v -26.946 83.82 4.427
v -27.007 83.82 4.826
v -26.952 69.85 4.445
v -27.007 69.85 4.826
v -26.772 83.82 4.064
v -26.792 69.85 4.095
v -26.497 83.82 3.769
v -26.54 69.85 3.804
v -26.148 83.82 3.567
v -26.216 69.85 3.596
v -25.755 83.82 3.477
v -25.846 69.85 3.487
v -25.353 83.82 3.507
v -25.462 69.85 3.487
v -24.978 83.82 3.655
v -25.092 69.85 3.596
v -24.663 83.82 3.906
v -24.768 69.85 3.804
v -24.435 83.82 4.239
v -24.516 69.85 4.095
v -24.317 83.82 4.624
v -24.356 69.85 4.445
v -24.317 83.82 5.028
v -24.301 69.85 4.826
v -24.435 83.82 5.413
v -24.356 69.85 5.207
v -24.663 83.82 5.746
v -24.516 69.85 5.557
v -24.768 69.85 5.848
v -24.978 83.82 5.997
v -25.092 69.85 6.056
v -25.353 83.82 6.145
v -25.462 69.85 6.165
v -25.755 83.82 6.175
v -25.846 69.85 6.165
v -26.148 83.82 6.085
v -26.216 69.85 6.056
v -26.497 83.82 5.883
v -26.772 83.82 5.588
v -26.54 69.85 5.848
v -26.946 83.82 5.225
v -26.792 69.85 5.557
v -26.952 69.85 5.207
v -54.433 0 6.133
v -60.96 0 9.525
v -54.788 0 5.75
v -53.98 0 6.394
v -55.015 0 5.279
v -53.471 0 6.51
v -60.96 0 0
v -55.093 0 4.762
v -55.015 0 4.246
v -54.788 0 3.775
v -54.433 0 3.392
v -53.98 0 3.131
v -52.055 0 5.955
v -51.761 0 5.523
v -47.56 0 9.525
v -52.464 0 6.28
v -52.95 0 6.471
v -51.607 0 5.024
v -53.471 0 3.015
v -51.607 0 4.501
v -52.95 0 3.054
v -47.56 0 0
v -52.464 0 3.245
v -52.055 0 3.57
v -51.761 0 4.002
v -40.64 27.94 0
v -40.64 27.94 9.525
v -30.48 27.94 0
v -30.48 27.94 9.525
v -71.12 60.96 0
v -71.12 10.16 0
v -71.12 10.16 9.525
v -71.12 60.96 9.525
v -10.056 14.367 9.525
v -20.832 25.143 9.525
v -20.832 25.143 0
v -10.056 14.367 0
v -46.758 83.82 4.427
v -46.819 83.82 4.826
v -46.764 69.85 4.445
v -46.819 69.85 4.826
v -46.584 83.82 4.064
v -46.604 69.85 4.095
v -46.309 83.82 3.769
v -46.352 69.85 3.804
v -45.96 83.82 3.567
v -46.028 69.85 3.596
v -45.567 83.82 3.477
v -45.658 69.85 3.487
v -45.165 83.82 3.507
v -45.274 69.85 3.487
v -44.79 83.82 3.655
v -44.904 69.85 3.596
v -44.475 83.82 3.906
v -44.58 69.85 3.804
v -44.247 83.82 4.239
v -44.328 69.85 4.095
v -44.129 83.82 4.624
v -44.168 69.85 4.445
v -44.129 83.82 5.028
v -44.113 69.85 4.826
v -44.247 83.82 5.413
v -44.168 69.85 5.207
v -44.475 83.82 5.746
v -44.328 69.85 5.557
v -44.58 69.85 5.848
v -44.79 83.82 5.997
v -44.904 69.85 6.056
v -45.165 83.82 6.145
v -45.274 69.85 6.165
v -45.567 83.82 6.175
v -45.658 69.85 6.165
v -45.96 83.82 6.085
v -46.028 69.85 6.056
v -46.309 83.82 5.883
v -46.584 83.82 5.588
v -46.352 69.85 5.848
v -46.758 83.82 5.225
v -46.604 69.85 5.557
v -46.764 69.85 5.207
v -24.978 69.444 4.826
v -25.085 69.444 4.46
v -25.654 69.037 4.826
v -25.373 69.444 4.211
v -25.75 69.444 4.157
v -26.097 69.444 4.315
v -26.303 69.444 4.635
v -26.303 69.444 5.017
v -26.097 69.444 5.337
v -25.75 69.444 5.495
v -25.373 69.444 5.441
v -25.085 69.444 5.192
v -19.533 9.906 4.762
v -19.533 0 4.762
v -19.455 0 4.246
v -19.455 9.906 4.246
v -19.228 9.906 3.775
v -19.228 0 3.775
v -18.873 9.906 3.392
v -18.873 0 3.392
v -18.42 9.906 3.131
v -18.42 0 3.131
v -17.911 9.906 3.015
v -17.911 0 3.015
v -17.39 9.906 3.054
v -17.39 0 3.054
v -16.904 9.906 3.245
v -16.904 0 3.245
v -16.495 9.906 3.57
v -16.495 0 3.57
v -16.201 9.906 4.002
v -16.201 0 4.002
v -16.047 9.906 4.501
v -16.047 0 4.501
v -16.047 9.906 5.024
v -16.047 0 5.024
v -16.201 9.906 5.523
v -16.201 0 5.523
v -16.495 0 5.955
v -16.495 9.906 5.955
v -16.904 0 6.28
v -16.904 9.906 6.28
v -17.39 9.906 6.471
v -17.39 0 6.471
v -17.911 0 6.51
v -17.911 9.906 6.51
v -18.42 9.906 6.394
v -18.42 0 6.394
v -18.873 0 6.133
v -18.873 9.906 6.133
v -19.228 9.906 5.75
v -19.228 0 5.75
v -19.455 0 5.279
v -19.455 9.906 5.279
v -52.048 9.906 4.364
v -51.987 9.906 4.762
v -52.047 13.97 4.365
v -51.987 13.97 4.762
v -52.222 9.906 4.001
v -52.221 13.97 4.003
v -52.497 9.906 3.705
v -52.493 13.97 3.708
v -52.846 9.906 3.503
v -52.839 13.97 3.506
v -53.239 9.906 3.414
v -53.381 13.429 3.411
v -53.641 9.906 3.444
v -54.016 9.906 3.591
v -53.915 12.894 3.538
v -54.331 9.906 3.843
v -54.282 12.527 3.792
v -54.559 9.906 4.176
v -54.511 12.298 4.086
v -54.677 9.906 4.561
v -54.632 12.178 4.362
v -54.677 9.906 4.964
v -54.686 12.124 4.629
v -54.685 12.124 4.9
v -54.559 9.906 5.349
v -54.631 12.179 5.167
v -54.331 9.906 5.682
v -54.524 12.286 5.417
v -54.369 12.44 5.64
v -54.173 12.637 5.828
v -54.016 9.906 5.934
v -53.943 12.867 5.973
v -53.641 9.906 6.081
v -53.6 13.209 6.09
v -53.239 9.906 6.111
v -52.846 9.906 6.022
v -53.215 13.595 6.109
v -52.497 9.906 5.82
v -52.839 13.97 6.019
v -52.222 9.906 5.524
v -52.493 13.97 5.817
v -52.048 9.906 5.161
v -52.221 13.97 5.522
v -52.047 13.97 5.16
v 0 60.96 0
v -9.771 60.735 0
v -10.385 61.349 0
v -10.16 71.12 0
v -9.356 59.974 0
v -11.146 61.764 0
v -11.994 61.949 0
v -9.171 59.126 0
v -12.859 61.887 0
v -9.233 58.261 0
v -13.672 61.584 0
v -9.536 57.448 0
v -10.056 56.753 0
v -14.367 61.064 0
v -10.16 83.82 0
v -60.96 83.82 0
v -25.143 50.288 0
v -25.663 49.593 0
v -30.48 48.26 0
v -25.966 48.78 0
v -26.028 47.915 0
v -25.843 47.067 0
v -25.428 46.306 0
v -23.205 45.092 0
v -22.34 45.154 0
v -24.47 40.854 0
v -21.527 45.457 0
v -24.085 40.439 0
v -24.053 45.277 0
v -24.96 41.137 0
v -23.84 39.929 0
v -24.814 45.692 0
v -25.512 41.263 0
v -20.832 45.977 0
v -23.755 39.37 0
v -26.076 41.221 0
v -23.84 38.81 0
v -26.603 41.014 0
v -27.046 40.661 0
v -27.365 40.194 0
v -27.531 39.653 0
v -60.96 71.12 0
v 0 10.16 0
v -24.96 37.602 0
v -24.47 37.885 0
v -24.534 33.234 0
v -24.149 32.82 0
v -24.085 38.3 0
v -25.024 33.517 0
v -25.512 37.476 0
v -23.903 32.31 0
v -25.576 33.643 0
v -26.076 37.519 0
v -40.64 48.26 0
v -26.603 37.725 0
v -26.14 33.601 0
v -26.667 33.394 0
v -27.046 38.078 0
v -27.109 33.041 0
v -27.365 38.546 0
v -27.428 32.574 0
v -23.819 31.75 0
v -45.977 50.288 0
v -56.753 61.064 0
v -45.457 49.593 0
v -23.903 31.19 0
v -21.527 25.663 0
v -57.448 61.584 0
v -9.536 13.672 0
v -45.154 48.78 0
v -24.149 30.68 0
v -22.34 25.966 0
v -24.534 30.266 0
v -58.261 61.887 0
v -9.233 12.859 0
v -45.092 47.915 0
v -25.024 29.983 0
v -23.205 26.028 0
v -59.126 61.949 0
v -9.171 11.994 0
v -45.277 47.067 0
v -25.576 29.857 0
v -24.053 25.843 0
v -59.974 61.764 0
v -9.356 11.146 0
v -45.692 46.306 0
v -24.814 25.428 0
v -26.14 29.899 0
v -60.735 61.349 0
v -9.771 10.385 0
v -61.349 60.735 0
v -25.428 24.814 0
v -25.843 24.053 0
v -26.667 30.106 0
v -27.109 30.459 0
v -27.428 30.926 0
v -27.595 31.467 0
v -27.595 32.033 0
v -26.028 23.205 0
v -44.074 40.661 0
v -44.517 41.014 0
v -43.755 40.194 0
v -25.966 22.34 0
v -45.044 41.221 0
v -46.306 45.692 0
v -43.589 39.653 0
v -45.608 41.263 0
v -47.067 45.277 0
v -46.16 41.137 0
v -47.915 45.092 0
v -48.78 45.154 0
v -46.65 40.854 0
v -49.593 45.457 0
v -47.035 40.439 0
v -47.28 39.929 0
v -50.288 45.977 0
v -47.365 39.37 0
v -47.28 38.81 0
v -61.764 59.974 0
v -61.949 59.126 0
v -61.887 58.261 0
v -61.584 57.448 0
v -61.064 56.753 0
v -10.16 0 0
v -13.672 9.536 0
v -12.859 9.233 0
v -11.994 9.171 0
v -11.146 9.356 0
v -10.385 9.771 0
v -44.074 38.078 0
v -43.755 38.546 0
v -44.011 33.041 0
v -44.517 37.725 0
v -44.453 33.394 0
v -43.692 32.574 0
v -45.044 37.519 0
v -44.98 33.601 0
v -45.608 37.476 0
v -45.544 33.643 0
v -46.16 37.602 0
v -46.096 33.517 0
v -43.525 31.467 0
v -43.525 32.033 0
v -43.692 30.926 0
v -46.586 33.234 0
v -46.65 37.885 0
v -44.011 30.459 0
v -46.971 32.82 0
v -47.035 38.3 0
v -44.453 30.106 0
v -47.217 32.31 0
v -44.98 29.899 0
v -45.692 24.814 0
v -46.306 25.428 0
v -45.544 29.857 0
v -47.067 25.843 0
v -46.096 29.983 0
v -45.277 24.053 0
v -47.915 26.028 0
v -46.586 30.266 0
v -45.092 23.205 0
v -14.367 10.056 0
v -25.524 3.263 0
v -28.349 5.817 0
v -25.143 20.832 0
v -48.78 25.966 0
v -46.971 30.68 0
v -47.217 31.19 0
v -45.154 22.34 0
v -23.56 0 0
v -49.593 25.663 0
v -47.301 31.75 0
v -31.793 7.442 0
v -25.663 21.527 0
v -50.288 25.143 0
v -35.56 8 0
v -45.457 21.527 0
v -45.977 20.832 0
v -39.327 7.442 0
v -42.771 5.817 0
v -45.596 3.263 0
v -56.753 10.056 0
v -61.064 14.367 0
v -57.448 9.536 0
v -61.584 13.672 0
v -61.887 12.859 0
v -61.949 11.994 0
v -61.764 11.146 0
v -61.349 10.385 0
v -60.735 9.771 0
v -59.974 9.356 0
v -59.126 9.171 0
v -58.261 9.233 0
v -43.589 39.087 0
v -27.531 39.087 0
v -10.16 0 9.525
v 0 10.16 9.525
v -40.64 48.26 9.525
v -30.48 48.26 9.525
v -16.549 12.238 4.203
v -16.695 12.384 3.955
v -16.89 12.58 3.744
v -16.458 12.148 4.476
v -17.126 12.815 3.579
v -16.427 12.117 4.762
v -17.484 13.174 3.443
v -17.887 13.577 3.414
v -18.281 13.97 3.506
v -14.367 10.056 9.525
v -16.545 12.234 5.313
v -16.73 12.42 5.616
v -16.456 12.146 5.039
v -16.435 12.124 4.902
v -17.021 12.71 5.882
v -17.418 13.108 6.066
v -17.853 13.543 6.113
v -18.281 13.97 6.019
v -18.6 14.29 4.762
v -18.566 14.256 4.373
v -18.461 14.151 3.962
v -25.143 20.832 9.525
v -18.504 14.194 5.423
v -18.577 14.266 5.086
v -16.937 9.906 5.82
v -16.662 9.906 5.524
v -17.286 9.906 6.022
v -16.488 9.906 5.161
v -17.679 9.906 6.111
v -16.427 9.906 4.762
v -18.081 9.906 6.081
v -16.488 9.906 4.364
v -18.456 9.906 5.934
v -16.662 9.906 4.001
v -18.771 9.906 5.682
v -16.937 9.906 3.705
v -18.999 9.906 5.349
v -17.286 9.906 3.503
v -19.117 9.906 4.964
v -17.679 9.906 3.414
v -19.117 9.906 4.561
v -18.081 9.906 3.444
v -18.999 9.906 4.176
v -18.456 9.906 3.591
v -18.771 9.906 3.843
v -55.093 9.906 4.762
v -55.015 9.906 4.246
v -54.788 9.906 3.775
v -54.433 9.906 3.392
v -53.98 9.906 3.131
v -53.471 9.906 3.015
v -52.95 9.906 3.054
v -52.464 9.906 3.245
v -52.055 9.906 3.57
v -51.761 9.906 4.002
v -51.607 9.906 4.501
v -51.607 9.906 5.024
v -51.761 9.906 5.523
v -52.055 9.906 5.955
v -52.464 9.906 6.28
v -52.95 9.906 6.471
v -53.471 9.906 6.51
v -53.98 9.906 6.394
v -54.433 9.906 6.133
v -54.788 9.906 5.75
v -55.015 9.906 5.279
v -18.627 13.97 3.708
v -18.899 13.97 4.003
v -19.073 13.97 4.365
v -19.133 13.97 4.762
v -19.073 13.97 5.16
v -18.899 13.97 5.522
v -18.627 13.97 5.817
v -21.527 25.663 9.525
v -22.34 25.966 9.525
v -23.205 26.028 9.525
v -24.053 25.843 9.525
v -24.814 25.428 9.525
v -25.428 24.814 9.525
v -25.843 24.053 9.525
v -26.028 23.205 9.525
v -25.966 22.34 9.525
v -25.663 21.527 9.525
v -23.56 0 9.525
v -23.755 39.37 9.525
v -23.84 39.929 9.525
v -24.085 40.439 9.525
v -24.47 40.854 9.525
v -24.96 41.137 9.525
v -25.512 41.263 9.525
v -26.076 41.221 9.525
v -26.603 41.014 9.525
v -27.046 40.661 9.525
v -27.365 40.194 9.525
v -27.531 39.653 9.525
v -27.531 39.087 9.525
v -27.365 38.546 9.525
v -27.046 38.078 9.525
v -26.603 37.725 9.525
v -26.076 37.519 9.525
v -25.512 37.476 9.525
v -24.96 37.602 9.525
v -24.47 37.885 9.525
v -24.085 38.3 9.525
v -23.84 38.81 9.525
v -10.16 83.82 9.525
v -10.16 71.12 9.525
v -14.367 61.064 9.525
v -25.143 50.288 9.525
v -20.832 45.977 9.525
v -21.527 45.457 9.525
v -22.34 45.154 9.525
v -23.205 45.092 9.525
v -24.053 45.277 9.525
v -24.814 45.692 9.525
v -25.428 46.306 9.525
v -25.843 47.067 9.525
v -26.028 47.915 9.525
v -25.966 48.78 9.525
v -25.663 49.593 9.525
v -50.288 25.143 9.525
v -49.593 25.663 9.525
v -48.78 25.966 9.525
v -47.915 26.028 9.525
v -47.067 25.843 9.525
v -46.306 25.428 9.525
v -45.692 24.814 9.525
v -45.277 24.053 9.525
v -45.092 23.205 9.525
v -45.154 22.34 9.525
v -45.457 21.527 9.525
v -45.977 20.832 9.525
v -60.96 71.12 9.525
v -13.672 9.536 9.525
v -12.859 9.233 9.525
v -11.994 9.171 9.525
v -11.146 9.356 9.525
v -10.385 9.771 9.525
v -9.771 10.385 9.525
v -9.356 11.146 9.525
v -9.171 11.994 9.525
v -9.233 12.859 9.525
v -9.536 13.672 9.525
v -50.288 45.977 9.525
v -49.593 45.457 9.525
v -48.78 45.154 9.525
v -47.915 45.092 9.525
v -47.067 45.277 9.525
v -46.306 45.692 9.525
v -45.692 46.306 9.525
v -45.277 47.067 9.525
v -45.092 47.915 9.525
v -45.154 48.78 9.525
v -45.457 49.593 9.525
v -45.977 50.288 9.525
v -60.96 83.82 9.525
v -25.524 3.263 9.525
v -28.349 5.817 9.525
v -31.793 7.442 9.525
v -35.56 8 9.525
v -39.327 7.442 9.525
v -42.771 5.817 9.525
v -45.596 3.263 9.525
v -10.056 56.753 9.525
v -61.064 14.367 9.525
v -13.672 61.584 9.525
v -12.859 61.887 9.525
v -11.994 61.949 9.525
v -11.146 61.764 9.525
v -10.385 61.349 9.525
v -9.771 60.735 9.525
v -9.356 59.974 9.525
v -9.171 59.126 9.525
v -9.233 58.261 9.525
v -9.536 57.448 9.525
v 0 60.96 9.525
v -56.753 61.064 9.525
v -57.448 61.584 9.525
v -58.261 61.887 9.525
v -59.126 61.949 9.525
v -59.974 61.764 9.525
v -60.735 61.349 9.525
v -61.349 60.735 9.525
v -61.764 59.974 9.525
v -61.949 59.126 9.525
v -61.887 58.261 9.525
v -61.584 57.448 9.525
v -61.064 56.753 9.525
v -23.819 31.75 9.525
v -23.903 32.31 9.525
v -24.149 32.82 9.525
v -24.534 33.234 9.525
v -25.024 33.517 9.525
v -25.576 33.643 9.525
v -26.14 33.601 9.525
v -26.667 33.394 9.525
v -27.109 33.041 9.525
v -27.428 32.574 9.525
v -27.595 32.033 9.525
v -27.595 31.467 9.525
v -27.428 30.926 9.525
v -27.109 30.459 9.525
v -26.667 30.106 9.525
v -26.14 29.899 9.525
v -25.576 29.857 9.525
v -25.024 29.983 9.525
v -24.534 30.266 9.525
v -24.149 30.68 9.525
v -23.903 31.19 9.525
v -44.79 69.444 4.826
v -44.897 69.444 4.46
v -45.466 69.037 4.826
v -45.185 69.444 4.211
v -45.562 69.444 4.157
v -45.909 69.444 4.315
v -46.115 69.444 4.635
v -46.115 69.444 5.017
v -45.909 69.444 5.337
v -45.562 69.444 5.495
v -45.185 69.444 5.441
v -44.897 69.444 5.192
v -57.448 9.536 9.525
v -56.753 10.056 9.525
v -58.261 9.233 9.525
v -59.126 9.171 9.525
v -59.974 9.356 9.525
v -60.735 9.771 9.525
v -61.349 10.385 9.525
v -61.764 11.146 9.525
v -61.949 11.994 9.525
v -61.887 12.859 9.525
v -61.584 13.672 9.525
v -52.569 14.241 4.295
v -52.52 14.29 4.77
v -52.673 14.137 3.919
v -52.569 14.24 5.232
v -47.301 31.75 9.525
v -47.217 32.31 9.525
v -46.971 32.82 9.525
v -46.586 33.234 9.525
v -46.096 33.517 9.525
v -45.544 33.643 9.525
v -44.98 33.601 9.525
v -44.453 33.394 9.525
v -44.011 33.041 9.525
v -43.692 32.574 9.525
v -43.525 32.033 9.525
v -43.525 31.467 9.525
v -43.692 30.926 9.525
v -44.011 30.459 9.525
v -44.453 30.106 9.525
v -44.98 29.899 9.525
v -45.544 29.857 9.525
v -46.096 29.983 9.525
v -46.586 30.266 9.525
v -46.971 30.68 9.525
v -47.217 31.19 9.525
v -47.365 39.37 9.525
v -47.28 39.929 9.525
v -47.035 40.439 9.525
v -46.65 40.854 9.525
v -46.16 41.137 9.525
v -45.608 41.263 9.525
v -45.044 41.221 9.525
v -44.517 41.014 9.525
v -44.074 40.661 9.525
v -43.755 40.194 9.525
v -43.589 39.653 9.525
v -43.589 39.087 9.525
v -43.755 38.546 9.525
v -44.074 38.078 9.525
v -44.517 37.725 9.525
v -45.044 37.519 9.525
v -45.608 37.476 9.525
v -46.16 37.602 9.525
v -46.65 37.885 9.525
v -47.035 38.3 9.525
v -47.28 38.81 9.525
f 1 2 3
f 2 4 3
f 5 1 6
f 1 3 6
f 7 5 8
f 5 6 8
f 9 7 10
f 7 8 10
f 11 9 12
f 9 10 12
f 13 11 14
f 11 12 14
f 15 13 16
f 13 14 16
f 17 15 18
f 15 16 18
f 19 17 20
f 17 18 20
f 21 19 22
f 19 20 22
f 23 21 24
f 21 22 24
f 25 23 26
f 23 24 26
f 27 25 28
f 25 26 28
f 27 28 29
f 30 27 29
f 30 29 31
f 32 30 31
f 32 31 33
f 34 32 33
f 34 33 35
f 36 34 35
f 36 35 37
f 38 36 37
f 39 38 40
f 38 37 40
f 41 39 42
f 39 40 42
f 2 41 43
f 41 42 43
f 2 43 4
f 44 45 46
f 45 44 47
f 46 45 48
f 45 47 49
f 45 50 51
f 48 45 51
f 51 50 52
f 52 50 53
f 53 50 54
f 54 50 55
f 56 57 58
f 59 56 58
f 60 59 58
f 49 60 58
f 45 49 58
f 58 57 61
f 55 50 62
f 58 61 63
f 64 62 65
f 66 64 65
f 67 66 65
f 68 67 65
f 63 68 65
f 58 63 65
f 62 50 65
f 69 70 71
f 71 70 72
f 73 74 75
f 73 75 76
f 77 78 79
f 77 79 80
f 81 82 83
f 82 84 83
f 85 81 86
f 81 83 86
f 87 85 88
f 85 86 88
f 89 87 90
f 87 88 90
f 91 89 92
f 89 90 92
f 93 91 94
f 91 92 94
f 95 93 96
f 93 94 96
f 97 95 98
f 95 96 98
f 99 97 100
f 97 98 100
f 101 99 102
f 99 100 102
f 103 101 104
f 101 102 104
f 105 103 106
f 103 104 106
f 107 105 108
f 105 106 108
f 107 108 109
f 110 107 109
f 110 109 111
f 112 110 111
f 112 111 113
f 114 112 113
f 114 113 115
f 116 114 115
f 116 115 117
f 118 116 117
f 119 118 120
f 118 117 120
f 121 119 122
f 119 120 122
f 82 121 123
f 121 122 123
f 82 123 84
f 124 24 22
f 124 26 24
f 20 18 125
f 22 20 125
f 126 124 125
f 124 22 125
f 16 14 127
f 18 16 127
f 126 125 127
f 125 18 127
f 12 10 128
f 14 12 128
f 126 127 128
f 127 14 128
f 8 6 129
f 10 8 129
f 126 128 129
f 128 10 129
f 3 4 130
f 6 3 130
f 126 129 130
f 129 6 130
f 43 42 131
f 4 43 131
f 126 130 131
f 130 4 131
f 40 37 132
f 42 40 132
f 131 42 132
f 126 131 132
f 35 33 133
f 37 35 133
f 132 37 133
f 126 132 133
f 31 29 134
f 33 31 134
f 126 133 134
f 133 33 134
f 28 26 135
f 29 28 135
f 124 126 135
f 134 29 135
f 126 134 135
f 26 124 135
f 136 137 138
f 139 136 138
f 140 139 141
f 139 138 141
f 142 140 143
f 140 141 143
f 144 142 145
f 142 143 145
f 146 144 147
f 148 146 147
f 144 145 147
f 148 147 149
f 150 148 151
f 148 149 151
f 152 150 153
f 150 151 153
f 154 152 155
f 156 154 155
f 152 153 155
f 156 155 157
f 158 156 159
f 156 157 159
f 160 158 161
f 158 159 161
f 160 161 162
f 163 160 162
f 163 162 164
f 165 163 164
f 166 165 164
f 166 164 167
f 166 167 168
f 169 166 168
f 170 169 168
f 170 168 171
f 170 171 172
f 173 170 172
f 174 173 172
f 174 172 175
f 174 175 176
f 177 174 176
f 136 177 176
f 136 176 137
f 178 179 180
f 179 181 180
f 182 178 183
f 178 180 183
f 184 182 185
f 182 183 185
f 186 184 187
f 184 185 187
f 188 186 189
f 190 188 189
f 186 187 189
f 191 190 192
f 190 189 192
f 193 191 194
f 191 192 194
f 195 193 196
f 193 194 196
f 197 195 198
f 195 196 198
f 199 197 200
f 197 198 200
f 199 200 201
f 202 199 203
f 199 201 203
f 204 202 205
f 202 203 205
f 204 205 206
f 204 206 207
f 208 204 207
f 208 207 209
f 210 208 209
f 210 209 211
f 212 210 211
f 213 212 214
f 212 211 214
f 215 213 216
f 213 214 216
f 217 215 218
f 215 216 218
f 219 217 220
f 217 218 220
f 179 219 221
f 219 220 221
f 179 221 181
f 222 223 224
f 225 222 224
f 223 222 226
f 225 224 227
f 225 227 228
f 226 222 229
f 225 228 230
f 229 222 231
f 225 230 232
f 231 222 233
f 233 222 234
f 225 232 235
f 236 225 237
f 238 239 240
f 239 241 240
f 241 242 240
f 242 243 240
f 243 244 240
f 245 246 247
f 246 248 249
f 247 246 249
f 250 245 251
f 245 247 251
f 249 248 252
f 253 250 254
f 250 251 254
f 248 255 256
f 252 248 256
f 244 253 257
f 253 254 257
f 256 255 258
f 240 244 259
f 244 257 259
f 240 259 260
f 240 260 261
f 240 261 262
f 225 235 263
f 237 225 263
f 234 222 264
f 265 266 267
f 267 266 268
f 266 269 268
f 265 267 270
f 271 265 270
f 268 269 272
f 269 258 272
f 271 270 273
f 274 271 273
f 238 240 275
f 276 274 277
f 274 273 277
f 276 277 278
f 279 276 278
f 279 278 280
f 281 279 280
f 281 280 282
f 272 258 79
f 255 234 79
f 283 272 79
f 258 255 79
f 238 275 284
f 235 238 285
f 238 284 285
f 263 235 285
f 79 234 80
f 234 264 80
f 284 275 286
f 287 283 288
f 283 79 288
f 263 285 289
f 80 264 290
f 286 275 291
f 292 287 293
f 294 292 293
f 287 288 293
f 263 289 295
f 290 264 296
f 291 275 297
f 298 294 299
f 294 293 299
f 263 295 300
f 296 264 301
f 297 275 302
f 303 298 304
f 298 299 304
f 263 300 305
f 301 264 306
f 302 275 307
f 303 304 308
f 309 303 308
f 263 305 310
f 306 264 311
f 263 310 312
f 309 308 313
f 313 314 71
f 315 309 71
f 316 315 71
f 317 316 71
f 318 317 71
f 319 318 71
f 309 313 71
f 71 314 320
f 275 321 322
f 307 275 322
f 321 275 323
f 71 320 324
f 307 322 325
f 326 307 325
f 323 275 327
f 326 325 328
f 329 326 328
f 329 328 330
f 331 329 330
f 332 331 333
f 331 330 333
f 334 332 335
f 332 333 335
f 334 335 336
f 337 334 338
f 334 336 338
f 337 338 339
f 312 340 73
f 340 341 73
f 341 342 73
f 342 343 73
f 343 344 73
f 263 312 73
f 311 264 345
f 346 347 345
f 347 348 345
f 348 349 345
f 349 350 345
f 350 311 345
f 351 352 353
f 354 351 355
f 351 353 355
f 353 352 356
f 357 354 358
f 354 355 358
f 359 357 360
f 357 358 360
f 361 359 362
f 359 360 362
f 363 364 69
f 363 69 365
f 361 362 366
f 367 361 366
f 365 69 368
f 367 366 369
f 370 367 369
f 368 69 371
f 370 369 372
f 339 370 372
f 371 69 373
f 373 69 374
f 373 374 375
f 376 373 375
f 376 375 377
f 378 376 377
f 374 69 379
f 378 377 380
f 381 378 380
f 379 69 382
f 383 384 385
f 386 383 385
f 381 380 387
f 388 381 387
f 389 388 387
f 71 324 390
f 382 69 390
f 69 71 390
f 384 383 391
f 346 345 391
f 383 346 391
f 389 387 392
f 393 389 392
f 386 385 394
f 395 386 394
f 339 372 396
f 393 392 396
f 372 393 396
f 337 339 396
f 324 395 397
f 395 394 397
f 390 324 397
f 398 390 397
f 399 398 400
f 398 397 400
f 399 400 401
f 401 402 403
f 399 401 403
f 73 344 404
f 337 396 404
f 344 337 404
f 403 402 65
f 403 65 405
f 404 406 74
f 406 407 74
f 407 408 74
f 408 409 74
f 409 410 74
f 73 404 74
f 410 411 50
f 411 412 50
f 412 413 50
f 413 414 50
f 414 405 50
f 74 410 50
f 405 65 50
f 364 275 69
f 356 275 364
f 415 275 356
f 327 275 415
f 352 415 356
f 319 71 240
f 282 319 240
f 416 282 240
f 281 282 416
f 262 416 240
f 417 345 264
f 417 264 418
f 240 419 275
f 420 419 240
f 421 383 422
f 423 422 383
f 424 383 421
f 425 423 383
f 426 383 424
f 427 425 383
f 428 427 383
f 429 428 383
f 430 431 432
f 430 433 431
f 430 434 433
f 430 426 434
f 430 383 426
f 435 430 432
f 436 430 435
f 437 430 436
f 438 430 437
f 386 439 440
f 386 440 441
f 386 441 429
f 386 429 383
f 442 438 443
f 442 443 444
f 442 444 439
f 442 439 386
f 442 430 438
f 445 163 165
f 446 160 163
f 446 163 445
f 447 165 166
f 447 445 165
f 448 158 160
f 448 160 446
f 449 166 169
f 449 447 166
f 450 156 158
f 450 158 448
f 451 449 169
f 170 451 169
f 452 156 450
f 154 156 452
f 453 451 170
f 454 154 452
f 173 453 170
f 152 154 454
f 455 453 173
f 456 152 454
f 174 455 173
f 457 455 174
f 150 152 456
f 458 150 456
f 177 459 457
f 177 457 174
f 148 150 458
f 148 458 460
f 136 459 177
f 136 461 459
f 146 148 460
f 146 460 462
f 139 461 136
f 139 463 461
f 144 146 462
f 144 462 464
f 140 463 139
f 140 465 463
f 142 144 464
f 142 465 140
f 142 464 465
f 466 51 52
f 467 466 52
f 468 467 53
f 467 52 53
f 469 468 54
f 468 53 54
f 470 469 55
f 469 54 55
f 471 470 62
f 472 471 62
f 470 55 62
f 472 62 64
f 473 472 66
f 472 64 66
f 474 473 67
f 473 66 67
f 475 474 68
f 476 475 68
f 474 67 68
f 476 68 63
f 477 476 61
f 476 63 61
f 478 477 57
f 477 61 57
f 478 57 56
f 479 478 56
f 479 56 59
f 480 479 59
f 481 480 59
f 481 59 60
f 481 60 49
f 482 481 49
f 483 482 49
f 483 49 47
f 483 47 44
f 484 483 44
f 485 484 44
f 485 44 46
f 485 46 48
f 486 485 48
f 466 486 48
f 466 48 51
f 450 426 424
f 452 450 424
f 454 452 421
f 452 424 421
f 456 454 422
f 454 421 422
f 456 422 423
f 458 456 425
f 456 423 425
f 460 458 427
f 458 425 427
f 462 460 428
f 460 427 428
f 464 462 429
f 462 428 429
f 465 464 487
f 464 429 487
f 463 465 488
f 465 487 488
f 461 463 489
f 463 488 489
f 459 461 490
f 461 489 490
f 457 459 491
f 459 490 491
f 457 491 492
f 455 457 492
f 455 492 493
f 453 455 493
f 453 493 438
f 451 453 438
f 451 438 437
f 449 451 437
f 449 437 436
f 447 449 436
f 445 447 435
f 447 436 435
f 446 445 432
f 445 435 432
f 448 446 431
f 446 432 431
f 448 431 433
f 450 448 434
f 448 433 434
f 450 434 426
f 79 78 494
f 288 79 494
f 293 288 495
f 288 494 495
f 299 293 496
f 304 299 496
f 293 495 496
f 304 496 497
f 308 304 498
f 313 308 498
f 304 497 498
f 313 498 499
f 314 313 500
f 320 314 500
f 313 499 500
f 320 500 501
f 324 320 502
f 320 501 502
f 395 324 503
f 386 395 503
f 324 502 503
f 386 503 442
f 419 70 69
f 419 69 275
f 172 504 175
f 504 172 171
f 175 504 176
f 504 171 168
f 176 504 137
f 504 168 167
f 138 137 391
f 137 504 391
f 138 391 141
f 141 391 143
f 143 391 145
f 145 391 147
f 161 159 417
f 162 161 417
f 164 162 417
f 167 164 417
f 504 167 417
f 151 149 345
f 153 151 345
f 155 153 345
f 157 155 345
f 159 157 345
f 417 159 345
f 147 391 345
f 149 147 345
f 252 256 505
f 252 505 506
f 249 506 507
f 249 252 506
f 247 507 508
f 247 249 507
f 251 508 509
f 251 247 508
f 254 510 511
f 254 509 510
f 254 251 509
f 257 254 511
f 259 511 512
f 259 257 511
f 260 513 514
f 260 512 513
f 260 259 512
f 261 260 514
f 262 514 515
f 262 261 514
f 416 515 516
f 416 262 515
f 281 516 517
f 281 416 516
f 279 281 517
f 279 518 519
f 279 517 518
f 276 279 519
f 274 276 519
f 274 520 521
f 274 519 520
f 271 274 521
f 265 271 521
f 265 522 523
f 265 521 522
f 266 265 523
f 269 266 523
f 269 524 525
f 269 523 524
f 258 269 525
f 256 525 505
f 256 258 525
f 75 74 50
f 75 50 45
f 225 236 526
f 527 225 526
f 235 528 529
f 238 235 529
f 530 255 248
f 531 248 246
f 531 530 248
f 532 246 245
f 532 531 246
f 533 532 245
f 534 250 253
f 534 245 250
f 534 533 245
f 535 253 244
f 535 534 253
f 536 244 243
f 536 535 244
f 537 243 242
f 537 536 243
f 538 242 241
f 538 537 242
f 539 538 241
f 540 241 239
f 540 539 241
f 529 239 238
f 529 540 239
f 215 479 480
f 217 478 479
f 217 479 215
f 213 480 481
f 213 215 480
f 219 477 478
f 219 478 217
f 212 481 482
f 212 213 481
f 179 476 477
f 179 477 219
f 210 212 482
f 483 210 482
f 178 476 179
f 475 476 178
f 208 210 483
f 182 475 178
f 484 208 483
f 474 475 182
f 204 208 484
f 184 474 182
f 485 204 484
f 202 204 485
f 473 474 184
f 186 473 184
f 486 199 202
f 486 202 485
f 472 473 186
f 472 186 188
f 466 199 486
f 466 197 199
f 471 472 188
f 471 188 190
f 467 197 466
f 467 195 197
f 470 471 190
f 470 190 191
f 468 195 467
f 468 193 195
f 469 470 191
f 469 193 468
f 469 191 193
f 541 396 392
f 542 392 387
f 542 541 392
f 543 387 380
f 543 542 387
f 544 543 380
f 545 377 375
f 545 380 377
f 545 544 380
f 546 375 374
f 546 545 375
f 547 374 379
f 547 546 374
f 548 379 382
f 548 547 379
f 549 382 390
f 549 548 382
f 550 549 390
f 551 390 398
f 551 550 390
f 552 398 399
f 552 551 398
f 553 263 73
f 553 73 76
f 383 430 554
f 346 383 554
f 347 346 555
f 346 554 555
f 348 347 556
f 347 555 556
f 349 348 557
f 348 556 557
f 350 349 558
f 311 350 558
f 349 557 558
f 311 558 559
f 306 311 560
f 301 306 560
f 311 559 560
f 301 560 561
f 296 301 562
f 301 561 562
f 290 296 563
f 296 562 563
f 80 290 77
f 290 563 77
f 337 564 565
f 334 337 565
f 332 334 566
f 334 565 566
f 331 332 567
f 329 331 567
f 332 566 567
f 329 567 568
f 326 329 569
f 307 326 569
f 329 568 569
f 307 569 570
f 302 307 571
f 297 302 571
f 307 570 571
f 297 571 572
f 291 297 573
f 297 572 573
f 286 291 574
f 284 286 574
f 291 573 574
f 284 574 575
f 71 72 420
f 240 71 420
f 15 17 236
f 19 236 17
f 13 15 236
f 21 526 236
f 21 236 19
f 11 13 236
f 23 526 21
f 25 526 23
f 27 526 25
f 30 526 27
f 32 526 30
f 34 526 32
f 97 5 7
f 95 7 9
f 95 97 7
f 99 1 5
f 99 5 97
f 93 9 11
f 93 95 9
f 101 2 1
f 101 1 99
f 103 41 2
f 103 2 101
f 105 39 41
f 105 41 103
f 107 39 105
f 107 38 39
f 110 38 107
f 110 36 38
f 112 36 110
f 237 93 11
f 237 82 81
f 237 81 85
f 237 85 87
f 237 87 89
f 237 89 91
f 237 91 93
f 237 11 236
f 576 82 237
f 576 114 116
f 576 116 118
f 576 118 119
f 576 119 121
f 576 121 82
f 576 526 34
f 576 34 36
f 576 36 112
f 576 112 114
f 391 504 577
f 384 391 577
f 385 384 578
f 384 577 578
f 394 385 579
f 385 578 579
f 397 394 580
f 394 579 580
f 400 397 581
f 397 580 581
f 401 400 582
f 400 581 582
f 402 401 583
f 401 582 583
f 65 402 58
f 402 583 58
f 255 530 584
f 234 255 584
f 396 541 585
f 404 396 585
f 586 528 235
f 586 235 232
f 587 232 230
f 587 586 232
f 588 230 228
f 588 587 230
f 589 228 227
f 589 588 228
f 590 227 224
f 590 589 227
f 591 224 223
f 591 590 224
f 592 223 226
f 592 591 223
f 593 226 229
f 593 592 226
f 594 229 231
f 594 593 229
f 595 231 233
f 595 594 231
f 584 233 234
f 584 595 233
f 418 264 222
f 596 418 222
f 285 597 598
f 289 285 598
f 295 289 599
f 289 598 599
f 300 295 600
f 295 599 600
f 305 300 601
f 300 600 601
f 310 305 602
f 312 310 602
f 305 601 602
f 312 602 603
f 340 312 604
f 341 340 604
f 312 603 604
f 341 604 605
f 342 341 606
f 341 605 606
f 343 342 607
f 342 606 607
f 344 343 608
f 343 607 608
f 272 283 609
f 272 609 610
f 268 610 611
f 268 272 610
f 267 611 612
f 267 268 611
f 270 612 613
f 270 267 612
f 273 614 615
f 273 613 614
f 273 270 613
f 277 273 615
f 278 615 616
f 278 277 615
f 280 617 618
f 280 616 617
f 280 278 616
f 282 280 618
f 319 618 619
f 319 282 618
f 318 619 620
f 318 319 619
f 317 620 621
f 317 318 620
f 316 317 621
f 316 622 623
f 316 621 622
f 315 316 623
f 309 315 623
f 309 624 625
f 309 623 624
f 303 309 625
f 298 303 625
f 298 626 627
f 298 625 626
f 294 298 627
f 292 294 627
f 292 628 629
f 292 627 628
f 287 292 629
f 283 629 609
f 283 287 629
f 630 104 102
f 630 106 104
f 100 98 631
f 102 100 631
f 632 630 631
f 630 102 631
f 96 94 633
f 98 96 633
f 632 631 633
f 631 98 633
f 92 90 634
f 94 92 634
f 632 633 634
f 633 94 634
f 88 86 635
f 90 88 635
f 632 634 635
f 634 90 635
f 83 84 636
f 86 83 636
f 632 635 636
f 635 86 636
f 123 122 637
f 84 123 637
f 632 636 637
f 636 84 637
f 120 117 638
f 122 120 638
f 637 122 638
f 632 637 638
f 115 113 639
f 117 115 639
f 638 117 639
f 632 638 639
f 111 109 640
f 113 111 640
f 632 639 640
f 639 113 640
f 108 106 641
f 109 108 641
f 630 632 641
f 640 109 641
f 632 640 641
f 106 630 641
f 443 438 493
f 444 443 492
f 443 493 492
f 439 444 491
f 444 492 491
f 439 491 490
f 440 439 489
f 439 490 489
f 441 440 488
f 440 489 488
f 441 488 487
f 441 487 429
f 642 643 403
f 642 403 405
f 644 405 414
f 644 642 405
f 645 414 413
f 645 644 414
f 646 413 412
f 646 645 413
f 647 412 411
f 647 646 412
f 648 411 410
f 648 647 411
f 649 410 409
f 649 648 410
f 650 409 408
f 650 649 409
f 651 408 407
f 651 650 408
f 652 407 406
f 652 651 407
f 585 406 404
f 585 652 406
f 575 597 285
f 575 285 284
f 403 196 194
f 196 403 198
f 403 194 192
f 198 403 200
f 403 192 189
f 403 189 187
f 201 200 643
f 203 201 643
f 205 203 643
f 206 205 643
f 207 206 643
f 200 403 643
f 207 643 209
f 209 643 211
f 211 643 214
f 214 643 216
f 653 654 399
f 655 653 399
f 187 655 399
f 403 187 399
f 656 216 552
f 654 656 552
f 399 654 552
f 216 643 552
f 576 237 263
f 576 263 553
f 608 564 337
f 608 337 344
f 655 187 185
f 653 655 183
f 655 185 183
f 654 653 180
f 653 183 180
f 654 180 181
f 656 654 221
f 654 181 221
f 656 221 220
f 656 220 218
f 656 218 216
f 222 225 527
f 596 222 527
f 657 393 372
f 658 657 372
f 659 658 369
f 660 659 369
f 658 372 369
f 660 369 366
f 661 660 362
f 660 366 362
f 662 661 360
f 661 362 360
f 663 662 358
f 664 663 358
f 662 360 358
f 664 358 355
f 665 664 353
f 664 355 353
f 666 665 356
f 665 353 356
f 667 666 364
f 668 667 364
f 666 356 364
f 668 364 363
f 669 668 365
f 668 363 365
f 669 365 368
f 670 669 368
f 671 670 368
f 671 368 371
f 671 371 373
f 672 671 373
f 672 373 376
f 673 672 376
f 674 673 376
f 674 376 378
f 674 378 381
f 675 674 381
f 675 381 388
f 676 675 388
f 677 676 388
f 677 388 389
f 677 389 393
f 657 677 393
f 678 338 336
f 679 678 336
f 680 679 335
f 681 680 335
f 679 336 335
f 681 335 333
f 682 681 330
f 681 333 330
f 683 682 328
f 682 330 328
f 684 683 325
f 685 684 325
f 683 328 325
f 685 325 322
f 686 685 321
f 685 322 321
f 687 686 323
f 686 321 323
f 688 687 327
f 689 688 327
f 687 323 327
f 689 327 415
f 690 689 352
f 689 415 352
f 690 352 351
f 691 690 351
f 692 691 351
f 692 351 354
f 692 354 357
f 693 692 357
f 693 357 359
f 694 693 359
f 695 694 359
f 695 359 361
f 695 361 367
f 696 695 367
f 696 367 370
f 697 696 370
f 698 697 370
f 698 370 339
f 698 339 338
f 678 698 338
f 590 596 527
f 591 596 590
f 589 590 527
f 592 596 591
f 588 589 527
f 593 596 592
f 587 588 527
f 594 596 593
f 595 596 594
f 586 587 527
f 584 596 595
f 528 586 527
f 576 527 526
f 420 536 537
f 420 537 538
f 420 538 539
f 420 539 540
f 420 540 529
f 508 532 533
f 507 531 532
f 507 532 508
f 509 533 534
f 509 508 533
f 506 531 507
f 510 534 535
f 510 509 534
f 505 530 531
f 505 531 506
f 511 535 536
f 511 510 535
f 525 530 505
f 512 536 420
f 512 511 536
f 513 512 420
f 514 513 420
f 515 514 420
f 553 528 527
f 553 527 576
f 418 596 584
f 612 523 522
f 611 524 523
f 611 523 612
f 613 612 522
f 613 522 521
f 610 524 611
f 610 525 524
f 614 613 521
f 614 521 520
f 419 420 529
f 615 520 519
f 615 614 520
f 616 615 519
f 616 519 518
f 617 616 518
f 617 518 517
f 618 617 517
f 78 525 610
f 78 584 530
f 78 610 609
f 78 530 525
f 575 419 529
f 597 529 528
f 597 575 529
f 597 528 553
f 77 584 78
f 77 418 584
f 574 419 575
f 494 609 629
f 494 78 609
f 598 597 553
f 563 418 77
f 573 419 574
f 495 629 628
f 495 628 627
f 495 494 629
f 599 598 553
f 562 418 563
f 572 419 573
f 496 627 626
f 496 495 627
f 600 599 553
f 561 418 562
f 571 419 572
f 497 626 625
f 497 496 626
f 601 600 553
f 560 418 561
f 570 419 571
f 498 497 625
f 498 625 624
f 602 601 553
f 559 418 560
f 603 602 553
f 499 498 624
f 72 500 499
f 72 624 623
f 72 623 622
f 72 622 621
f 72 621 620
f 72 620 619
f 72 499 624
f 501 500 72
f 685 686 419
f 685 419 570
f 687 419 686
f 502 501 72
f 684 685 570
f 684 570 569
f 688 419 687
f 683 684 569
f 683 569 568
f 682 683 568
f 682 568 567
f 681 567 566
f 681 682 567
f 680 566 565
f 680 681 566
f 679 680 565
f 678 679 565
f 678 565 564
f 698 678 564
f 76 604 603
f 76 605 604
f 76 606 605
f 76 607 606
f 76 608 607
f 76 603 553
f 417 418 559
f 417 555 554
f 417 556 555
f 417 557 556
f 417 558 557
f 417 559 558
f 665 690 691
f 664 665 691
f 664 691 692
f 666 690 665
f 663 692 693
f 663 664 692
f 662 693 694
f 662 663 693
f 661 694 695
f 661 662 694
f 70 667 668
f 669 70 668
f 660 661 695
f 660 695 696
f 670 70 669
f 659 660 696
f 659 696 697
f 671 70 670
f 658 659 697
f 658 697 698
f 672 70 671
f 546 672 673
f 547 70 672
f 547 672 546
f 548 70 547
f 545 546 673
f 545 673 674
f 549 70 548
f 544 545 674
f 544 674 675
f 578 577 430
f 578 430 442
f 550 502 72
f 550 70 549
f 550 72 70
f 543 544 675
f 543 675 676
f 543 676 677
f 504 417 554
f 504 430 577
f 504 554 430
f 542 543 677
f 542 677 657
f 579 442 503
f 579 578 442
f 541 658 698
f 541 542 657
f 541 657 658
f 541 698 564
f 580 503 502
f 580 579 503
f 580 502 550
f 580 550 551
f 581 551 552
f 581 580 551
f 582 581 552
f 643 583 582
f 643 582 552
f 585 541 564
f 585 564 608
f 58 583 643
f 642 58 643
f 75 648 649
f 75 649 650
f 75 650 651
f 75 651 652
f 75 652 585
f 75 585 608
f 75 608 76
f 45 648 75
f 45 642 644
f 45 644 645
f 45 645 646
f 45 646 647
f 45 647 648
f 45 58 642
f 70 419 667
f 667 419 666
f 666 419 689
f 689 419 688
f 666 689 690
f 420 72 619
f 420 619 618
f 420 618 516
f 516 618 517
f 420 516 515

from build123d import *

# Parameters (mm, degrees)
SKETCH1_W                       = 71.12
SKETCH1_H                       = 71.12
EXTRUDE1_DEPTH                  = 9.525
SKETCH3_R                       = 3.048
CUT_EXTRUDE1_DEPTH              = 10.525
MIRROR3_COPY_1_SKETCH_R         = 3.048
MIRROR3_COPY_1_DEPTH            = 10.525
MIRROR3_COPY_2_SKETCH_R         = 3.048
MIRROR3_COPY_2_DEPTH            = 10.525
SKETCH5_W                       = 10.16
SKETCH5_H                       = 20.32
CUT_EXTRUDE4_DEPTH              = 10.525
SKETCH20_R                      = 13
CUT_EXTRUDE5_DEPTH              = 10.525
CHAMFER1_SIZE                   = 10.16
CHAMFER2_SIZE                   = 10.16
F_6_CLEARANCE_HOLE1_D           = 3.7973
CHAMFER3_SIZE                   = 10.16
SKETCH26_W                      = 50.8
SKETCH26_H                      = 9.525
EXTRUDE2_DEPTH                  = 12.7
F_6_32_TAPPED_HOLE4_D           = 2.7051
F_6_32_TAPPED_HOLE4_DEPTH       = 13.97
F_6_32_TAPPED_HOLE4_CBORE_D     = 3.5052
F_6_32_TAPPED_HOLE4_CBORE_DEPTH = 9.906
F_6_32_TAPPED_HOLE4_TIP         = 0.81269403
F_6_32_TAPPED_HOLE5_D           = 2.7051
F_6_32_TAPPED_HOLE5_DEPTH       = 13.97
F_6_32_TAPPED_HOLE5_TIP         = 0.81269403


with BuildPart() as part:
    # Sketch1 → Extrude1 (new body)
    with BuildSketch(Plane.XY):
        with Locations((-35.56, 35.56)):
            Rectangle(SKETCH1_W, SKETCH1_H)
    extrude(amount=EXTRUDE1_DEPTH)

    # Sketch3 → Cut-Extrude1 (cut, through all)
    with BuildSketch(Plane.XY.offset(9.525)):
        with Locations((-58.908665915, 58.908665915)):
            Circle(SKETCH3_R)
        with Locations((-48.132358569, 48.132358569)):
            Circle(SKETCH3_R)
        Polygon((-58.908665915, 58.908665915), (-56.753404446, 61.063927384), (-45.9770971, 50.287620039), (-50.287620039, 45.9770971), (-61.063927384, 56.753404446), align=None)
    cut_extrude1 = extrude(amount=-CUT_EXTRUDE1_DEPTH, mode=Mode.SUBTRACT)

    # Mirror1: Cut-Extrude1 across plane
    add(cut_extrude1.mirror(Plane.ZX.offset(35.56)), mode=Mode.SUBTRACT)

    # Mirror2: Cut-Extrude1 across plane
    add(cut_extrude1.mirror(Plane(origin=(-35.56, 0, 0), x_dir=(0, 0, 1), z_dir=(1, 0, 0))), mode=Mode.SUBTRACT)

    # Mirror3 copy 1 sketch → Mirror3 copy 1 (cut, through all)
    with BuildSketch(Plane(origin=(-71.12, 71.12, 9.525), x_dir=(-1, 0, 0), z_dir=(0, 0, 1))):
        with Locations((-58.908665915, 58.908665915)):
            Circle(MIRROR3_COPY_1_SKETCH_R)
        with Locations((-48.132358569, 48.132358569)):
            Circle(MIRROR3_COPY_1_SKETCH_R)
        Polygon((-58.908665915, 58.908665915), (-56.753404446, 61.063927384), (-45.9770971, 50.287620039), (-50.287620039, 45.9770971), (-61.063927384, 56.753404446), align=None)
    extrude(amount=-MIRROR3_COPY_1_DEPTH, mode=Mode.SUBTRACT)

    # Mirror3 copy 2 sketch → Mirror3 copy 2 (cut, through all)
    with BuildSketch(Plane(origin=(0, 71.12, 9.525), x_dir=(1, 0, 0), z_dir=(0, 0, 1))):
        with Locations((-58.908665915, -58.908665915)):
            Circle(MIRROR3_COPY_2_SKETCH_R)
        with Locations((-48.132358569, -48.132358569)):
            Circle(MIRROR3_COPY_2_SKETCH_R)
        Polygon((-58.908665915, -58.908665915), (-56.753404446, -61.063927384), (-45.9770971, -50.287620039), (-50.287620039, -45.9770971), (-61.063927384, -56.753404446), align=None)
    extrude(amount=-MIRROR3_COPY_2_DEPTH, mode=Mode.SUBTRACT)

    # Sketch5 → Cut-Extrude4 (cut, through all)
    with BuildSketch(Plane.XY.offset(9.525)):
        with Locations((-35.56, 38.1)):
            Rectangle(SKETCH5_W, SKETCH5_H)
    extrude(amount=-CUT_EXTRUDE4_DEPTH, mode=Mode.SUBTRACT)

    # Sketch20 → Cut-Extrude5 (cut, through all)
    with BuildSketch(Plane.XY.offset(9.525)):
        with Locations((-35.56, -5)):
            Circle(SKETCH20_R)
    extrude(amount=-CUT_EXTRUDE5_DEPTH, mode=Mode.SUBTRACT)

    # Chamfer1
    chamfer1_edges = [part.edges().sort_by_distance(p)[0] for p in [
        (-71.12, 71.12, 4.7625),
    ]]
    chamfer(chamfer1_edges, length=CHAMFER1_SIZE)

    # Chamfer2
    chamfer2_edges = [part.edges().sort_by_distance(p)[0] for p in [
        (0, 71.12, 4.7625),
    ]]
    chamfer(chamfer2_edges, length=CHAMFER2_SIZE)

    # #6 Clearance Hole1 (through all)
    with Locations(Plane(origin=(-45.4025, 31.75, 9.525), x_dir=(1, 0, 0), z_dir=(0, 0, 1))):
        with Locations((0, 0), (-0.0635, 7.619735412)):
            f_6_clearance_hole1 = Hole(F_6_CLEARANCE_HOLE1_D / 2)

    # Mirror11: #6 Clearance Hole1 across plane
    add(f_6_clearance_hole1.mirror(Plane(origin=(-35.56, 0, 0), x_dir=(0, 0, 1), z_dir=(1, 0, 0))), mode=Mode.SUBTRACT)

    # Chamfer3
    chamfer3_edges = [part.edges().sort_by_distance(p)[0] for p in [
        (0, 0, 4.7625),
        (-71.12, 0, 4.7625),
    ]]
    chamfer(chamfer3_edges, length=CHAMFER3_SIZE)

    # Sketch26 → Extrude2 (add)
    with BuildSketch(Plane(origin=(0, 71.12, 0), x_dir=(-1, 0, 0), z_dir=(0, 1, 0))):
        with Locations((35.56, 4.7625)):
            Rectangle(SKETCH26_W, SKETCH26_H)
    extrude(amount=EXTRUDE2_DEPTH)

    # #6-32 Tapped Hole4
    with Locations(Plane(origin=(-53.34, 0, 4.7625), x_dir=(-1, 0, 0), z_dir=(0, -1, 0))):
        with Locations((0, 0), (-35.56, 0)):
            CounterBoreHole(F_6_32_TAPPED_HOLE4_D / 2, F_6_32_TAPPED_HOLE4_CBORE_D / 2, F_6_32_TAPPED_HOLE4_CBORE_DEPTH, depth=F_6_32_TAPPED_HOLE4_DEPTH)
            with Locations((0, 0, -(F_6_32_TAPPED_HOLE4_DEPTH + F_6_32_TAPPED_HOLE4_TIP / 2))):  # 118° drill point
                Cone(0, F_6_32_TAPPED_HOLE4_D / 2, F_6_32_TAPPED_HOLE4_TIP, mode=Mode.SUBTRACT)

    # #6-32 Tapped Hole5
    with Locations(Plane(origin=(-45.466, 83.82, 4.826), x_dir=(1, 0, 0), z_dir=(0, 1, 0))):
        with Locations((0, 0), (19.812, 0)):
            Hole(F_6_32_TAPPED_HOLE5_D / 2, depth=F_6_32_TAPPED_HOLE5_DEPTH)
            with Locations((0, 0, -(F_6_32_TAPPED_HOLE5_DEPTH + F_6_32_TAPPED_HOLE5_TIP / 2))):  # 118° drill point
                Cone(0, F_6_32_TAPPED_HOLE5_D / 2, F_6_32_TAPPED_HOLE5_TIP, mode=Mode.SUBTRACT)


solid = part.part
